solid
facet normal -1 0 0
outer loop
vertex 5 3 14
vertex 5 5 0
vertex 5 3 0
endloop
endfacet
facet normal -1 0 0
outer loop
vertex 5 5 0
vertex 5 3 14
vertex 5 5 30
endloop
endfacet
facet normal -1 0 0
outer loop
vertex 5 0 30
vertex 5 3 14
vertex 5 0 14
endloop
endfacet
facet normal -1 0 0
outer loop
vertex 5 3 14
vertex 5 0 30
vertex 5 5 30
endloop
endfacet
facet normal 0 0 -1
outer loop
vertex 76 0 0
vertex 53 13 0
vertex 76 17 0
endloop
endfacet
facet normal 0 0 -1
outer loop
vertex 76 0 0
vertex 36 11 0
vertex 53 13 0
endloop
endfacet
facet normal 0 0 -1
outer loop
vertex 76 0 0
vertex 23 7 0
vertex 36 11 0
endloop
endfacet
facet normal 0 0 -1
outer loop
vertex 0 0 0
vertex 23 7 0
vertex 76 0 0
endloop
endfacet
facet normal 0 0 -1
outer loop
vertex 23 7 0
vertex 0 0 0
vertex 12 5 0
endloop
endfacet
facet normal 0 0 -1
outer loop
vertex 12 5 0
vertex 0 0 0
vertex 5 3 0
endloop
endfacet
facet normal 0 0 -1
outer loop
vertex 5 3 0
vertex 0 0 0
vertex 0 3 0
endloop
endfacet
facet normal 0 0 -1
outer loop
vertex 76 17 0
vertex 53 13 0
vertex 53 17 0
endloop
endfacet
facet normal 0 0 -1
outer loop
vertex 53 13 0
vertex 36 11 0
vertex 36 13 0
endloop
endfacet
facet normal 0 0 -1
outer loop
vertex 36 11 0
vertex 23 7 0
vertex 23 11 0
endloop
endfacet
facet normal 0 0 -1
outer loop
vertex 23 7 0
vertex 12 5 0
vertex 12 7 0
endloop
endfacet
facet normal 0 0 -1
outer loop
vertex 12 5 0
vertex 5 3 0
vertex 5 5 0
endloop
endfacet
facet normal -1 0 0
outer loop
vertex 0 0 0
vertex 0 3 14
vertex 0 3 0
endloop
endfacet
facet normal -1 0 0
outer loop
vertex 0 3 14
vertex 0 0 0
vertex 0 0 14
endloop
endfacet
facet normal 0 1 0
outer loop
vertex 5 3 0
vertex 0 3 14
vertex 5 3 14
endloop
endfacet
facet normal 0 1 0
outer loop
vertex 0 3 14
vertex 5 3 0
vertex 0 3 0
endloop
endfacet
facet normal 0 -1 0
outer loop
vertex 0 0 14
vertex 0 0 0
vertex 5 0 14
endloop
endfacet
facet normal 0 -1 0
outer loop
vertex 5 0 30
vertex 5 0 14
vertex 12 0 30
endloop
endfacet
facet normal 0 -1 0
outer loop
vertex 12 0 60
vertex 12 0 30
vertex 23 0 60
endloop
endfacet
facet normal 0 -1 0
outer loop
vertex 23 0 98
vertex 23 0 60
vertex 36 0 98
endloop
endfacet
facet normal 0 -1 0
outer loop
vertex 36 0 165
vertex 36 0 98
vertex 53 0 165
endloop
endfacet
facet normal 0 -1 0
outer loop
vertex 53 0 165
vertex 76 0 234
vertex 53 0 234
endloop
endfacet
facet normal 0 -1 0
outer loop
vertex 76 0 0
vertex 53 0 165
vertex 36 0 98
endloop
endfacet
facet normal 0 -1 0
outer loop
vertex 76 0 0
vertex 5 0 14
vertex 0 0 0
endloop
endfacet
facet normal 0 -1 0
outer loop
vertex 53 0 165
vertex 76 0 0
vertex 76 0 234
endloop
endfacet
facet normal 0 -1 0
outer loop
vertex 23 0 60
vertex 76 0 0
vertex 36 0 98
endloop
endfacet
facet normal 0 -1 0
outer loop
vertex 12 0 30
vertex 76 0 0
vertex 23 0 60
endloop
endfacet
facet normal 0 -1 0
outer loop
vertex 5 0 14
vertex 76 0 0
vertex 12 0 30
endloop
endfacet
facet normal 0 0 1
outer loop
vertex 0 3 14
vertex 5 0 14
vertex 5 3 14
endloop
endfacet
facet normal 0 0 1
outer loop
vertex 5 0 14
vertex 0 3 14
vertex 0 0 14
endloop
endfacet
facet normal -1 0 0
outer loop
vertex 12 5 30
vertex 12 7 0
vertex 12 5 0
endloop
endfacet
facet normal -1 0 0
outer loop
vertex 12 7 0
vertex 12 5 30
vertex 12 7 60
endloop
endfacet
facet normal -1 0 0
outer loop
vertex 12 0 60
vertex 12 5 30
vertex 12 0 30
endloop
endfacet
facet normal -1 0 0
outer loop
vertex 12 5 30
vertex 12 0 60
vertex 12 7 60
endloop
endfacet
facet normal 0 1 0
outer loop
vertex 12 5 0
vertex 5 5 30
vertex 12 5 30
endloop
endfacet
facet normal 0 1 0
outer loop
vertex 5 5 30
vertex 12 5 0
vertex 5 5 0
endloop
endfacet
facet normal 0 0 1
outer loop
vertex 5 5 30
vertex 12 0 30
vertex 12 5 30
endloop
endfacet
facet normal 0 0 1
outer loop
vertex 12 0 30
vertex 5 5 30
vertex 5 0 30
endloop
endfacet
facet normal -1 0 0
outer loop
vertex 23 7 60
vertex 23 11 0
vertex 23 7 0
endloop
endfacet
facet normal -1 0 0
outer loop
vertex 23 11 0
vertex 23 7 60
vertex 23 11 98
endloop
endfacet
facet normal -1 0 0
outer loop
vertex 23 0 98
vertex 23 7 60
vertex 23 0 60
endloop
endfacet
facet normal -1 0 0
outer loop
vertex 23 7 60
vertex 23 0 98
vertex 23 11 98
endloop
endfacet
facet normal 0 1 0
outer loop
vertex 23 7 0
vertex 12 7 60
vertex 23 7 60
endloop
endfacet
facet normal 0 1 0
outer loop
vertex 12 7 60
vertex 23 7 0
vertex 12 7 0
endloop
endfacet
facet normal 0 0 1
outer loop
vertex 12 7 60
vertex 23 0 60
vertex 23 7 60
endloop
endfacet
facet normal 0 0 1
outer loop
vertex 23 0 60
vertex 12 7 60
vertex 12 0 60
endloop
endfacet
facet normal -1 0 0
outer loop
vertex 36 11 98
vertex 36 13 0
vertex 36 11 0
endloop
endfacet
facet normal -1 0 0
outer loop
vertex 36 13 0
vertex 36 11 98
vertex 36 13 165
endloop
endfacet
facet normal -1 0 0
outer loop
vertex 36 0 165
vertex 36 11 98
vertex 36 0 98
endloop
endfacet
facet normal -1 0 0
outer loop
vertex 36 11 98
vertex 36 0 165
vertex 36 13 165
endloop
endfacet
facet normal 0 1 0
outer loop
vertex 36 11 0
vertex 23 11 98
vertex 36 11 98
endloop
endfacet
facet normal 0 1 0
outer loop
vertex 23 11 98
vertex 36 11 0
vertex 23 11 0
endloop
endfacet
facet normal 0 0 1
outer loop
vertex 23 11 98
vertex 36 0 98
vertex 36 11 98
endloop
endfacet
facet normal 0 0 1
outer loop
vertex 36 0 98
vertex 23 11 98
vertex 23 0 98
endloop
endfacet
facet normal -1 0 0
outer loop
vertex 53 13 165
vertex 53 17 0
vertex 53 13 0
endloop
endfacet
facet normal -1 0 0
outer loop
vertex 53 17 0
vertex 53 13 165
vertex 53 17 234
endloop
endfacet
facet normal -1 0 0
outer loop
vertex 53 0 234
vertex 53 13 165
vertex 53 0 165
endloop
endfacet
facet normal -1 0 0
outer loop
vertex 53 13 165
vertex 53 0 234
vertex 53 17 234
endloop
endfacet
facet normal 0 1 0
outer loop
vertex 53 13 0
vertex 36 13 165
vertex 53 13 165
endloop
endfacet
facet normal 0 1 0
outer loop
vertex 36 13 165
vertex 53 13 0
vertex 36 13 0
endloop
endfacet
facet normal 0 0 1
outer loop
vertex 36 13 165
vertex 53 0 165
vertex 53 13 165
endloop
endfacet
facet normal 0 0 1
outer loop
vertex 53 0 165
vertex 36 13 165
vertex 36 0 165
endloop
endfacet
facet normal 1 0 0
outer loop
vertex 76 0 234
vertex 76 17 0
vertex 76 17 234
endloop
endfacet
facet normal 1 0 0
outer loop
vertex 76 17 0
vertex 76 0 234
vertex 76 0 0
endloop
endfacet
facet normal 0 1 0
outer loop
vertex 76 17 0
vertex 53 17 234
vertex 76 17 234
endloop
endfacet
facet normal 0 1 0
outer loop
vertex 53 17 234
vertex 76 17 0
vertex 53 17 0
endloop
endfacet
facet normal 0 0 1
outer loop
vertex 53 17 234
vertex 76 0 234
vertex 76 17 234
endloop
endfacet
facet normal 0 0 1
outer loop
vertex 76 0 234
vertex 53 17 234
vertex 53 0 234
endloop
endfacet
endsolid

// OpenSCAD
translate([2.5, 1.5, 1.0]) color([0.5452081159439722, 0.1562211098090489, 0.7062940429996885]) cube([5, 3, 2], center=true);
translate([2.5, 1.5, 3.0]) color([0.4714349217158037, 0.6781787462359636, 0.7600898367234922]) cube([5, 3, 2], center=true);
translate([2.5, 1.5, 5.0]) color([0.23236272144124515, 0.7619950130977117, 0.28008838468838926]) cube([5, 3, 2], center=true);
translate([2.5, 1.5, 7.0]) color([0.9840151371182455, 0.12083161078451865, 0.8837180187440564]) cube([5, 3, 2], center=true);
translate([2.5, 1.5, 9.0]) color([0.040547125043371324, 0.256575818348144, 0.5261019087624684]) cube([5, 3, 2], center=true);
translate([2.5, 1.5, 11.0]) color([0.5816161834445946, 0.3962349850280922, 0.10203172822707107]) cube([5, 3, 2], center=true);
translate([2.5, 1.5, 13.0]) color([0.2526080858247133, 0.28339650386048865, 0.7552228545587315]) cube([5, 3, 2], center=true);
translate([8.5, 2.5, 1.5]) color([0.9087743252220071, 0.5954099154864194, 0.03545096569102746]) cube([7, 5, 3], center=true);
translate([8.5, 2.5, 4.5]) color([0.7922364716417103, 0.30560393283991993, 0.33989040641624346]) cube([7, 5, 3], center=true);
translate([8.5, 2.5, 7.5]) color([0.5301854376454147, 0.24904704757555507, 0.9199780878573697]) cube([7, 5, 3], center=true);
translate([8.5, 2.5, 10.5]) color([0.1635547583408129, 0.41483040050373277, 0.2896919495072058]) cube([7, 5, 3], center=true);
translate([8.5, 2.5, 13.5]) color([0.5198341022016146, 0.5739818030823766, 0.6271396891048426]) cube([7, 5, 3], center=true);
translate([8.5, 2.5, 16.5]) color([0.5313758038379728, 0.4108045023355995, 0.634594012376466]) cube([7, 5, 3], center=true);
translate([8.5, 2.5, 19.5]) color([0.40341287658681757, 0.7785502590540477, 0.7881774252549901]) cube([7, 5, 3], center=true);
translate([8.5, 2.5, 22.5]) color([0.29225416811082217, 0.37180432355577453, 0.6288109059468862]) cube([7, 5, 3], center=true);
translate([8.5, 2.5, 25.5]) color([0.15706996711565713, 0.6970319309869248, 0.3814277529807131]) cube([7, 5, 3], center=true);
translate([8.5, 2.5, 28.5]) color([0.591062474757007, 0.1395330992312218, 0.6682583860975598]) cube([7, 5, 3], center=true);
translate([17.5, 3.5, 2.5]) color([0.3540578606136997, 0.4726655762072315, 0.4151074008495357]) cube([11, 7, 5], center=true);
translate([17.5, 3.5, 7.5]) color([0.47671524799509457, 0.6946956329164442, 0.31824017683207795]) cube([11, 7, 5], center=true);
translate([17.5, 3.5, 12.5]) color([0.6520544808985483, 0.060222107499701916, 0.3001851524622099]) cube([11, 7, 5], center=true);
translate([17.5, 3.5, 17.5]) color([0.7452096901500458, 0.05240587806206365, 0.6211421952822352]) cube([11, 7, 5], center=true);
translate([17.5, 3.5, 22.5]) color([0.025546799267838538, 0.4715288683099005, 0.8885450437134765]) cube([11, 7, 5], center=true);
translate([17.5, 3.5, 27.5]) color([0.010110093997603875, 0.5268280206539229, 0.06645682965886301]) cube([11, 7, 5], center=true);
translate([17.5, 3.5, 32.5]) color([0.8671097761494883, 0.6862965222396646, 0.7419538566814291]) cube([11, 7, 5], center=true);
translate([17.5, 3.5, 37.5]) color([0.669007579945888, 0.006423453698145676, 0.041177862257898545]) cube([11, 7, 5], center=true);
translate([17.5, 3.5, 42.5]) color([0.6208768040220466, 0.9996851255769114, 0.8731472390917929]) cube([11, 7, 5], center=true);
translate([17.5, 3.5, 47.5]) color([0.699685806725371, 0.7270999543422898, 0.2266870226016624]) cube([11, 7, 5], center=true);
translate([17.5, 3.5, 52.5]) color([0.751613934135812, 0.28792410486343756, 0.10546026702239297]) cube([11, 7, 5], center=true);
translate([17.5, 3.5, 57.5]) color([0.4608948954667579, 0.33019577252961807, 0.168255398651179]) cube([11, 7, 5], center=true);
translate([29.5, 5.5, 3.5]) color([0.42170989251140467, 0.8972009769638755, 0.4352702732981688]) cube([13, 11, 7], center=true);
translate([29.5, 5.5, 10.5]) color([0.4472918952497248, 0.708827757444238, 0.5241618701522923]) cube([13, 11, 7], center=true);
translate([29.5, 5.5, 17.5]) color([0.12922303534199353, 0.91039239754397, 0.4441243361619651]) cube([13, 11, 7], center=true);
translate([29.5, 5.5, 24.5]) color([0.7893377392253591, 0.38887513002224416, 0.806846018820692]) cube([13, 11, 7], center=true);
translate([29.5, 5.5, 31.5]) color([0.3895364160074527, 0.2201595216660458, 0.19619466691666865]) cube([13, 11, 7], center=true);
translate([29.5, 5.5, 38.5]) color([0.9400346443375104, 0.58653025858102, 0.04979326505826487]) cube([13, 11, 7], center=true);
translate([29.5, 5.5, 45.5]) color([0.38834759617804915, 0.234029260524927, 0.08465706460929934]) cube([13, 11, 7], center=true);
translate([29.5, 5.5, 52.5]) color([0.18675586852140846, 0.05699047999950346, 0.6380736282281027]) cube([13, 11, 7], center=true);
translate([29.5, 5.5, 59.5]) color([0.17337386483746886, 0.6107798762435255, 0.6125067478912297]) cube([13, 11, 7], center=true);
translate([29.5, 5.5, 66.5]) color([0.7049237107399368, 0.5121186506114312, 0.28442399033479826]) cube([13, 11, 7], center=true);
translate([29.5, 5.5, 73.5]) color([0.8774574539285279, 0.35307108172351365, 0.4582943249787391]) cube([13, 11, 7], center=true);
translate([29.5, 5.5, 80.5]) color([0.6318794317305464, 0.5161242981674495, 0.9564683485665337]) cube([13, 11, 7], center=true);
translate([29.5, 5.5, 87.5]) color([0.9547176774381221, 0.9297598506094263, 0.9340763496652581]) cube([13, 11, 7], center=true);
translate([29.5, 5.5, 94.5]) color([0.580960135568696, 0.49020206373000297, 0.7041168173823689]) cube([13, 11, 7], center=true);
translate([44.5, 6.5, 5.5]) color([0.21541959298546798, 0.26587203921552827, 0.04380725363309168]) cube([17, 13, 11], center=true);
translate([44.5, 6.5, 16.5]) color([0.16285754255803098, 0.0038745499388105342, 0.6546275765234981]) cube([17, 13, 11], center=true);
translate([44.5, 6.5, 27.5]) color([0.14040698903568194, 0.7866793455760521, 0.680503995881725]) cube([17, 13, 11], center=true);
translate([44.5, 6.5, 38.5]) color([0.9706757933544957, 0.3965144869518913, 0.9213919134510528]) cube([17, 13, 11], center=true);
translate([44.5, 6.5, 49.5]) color([0.4537041723195332, 0.3395037398362071, 0.10233886991705377]) cube([17, 13, 11], center=true);
translate([44.5, 6.5, 60.5]) color([0.8828321850718597, 0.7947901585625868, 0.3229289765350606]) cube([17, 13, 11], center=true);
translate([44.5, 6.5, 71.5]) color([0.45574438492562896, 0.32514346581324827, 0.028829116538094723]) cube([17, 13, 11], center=true);
translate([44.5, 6.5, 82.5]) color([0.04435252539911694, 0.3687041258820589, 0.20959132812878367]) cube([17, 13, 11], center=true);
translate([44.5, 6.5, 93.5]) color([0.5245146032105923, 0.1877850356496189, 0.2016215864664097]) cube([17, 13, 11], center=true);
translate([44.5, 6.5, 104.5]) color([0.6726678813176303, 0.7356026567617159, 0.31223209587410494]) cube([17, 13, 11], center=true);
translate([44.5, 6.5, 115.5]) color([0.8599943994333726, 0.2546391746557106, 0.34394037628155716]) cube([17, 13, 11], center=true);
translate([44.5, 6.5, 126.5]) color([0.712480390369609, 0.04450290132920964, 0.934183460116191]) cube([17, 13, 11], center=true);
translate([44.5, 6.5, 137.5]) color([0.07233773178762537, 0.4609310589380602, 0.7246048259600892]) cube([17, 13, 11], center=true);
translate([44.5, 6.5, 148.5]) color([0.04746853498479808, 0.8090026856371774, 0.9788933433114139]) cube([17, 13, 11], center=true);
translate([44.5, 6.5, 159.5]) color([0.460511672795628, 0.11812363628756806, 0.08147699565547994]) cube([17, 13, 11], center=true);
translate([64.5, 8.5, 6.5]) color([0.09873043616313526, 0.7654413741364753, 0.4140128484685186]) cube([23, 17, 13], center=true);
translate([64.5, 8.5, 19.5]) color([0.9192341581990311, 0.4406397760864845, 0.07714331014460807]) cube([23, 17, 13], center=true);
translate([64.5, 8.5, 32.5]) color([0.42693558751800065, 0.7548278934255565, 0.8293384268467949]) cube([23, 17, 13], center=true);
translate([64.5, 8.5, 45.5]) color([0.039351686529191854, 0.1803893912563338, 0.490013452023644]) cube([23, 17, 13], center=true);
translate([64.5, 8.5, 58.5]) color([0.12808547795160863, 0.8710926419421733, 0.9344608884461488]) cube([23, 17, 13], center=true);
translate([64.5, 8.5, 71.5]) color([0.3195969983538176, 0.43484368255202, 0.5570540644200566]) cube([23, 17, 13], center=true);
translate([64.5, 8.5, 84.5]) color([0.2855057910835891, 0.5410756974595614, 0.2011850454737838]) cube([23, 17, 13], center=true);
translate([64.5, 8.5, 97.5]) color([0.2966412512769129, 0.44178363318767744, 0.604669902191143]) cube([23, 17, 13], center=true);
translate([64.5, 8.5, 110.5]) color([0.5361650260862432, 0.2609879767339395, 0.23178787541805523]) cube([23, 17, 13], center=true);
translate([64.5, 8.5, 123.5]) color([0.11873023670071103, 0.7834936358921726, 0.09890076646638046]) cube([23, 17, 13], center=true);
translate([64.5, 8.5, 136.5]) color([0.7328850061793606, 0.2487736956630997, 0.28455698400578255]) cube([23, 17, 13], center=true);
translate([64.5, 8.5, 149.5]) color([0.7360834330107994, 0.6596207917216363, 0.7419215555155583]) cube([23, 17, 13], center=true);
translate([64.5, 8.5, 162.5]) color([0.5152830587943614, 0.8590958196652707, 0.12179389137547159]) cube([23, 17, 13], center=true);
translate([64.5, 8.5, 175.5]) color([0.6451969614065052, 0.11824431248865597, 0.7372833681454282]) cube([23, 17, 13], center=true);
translate([64.5, 8.5, 188.5]) color([0.3589046614584527, 0.67488210437111, 0.7034839134412817]) cube([23, 17, 13], center=true);
translate([64.5, 8.5, 201.5]) color([0.6606084576410584, 0.22155798032782648, 0.8317998863873537]) cube([23, 17, 13], center=true);
translate([64.5, 8.5, 214.5]) color([0.24013608742346748, 0.5181532972121122, 0.6746457541533513]) cube([23, 17, 13], center=true);
translate([64.5, 8.5, 227.5]) color([0.23360317478475656, 0.628511722983939, 0.2868310479973286]) cube([23, 17, 13], center=true);
